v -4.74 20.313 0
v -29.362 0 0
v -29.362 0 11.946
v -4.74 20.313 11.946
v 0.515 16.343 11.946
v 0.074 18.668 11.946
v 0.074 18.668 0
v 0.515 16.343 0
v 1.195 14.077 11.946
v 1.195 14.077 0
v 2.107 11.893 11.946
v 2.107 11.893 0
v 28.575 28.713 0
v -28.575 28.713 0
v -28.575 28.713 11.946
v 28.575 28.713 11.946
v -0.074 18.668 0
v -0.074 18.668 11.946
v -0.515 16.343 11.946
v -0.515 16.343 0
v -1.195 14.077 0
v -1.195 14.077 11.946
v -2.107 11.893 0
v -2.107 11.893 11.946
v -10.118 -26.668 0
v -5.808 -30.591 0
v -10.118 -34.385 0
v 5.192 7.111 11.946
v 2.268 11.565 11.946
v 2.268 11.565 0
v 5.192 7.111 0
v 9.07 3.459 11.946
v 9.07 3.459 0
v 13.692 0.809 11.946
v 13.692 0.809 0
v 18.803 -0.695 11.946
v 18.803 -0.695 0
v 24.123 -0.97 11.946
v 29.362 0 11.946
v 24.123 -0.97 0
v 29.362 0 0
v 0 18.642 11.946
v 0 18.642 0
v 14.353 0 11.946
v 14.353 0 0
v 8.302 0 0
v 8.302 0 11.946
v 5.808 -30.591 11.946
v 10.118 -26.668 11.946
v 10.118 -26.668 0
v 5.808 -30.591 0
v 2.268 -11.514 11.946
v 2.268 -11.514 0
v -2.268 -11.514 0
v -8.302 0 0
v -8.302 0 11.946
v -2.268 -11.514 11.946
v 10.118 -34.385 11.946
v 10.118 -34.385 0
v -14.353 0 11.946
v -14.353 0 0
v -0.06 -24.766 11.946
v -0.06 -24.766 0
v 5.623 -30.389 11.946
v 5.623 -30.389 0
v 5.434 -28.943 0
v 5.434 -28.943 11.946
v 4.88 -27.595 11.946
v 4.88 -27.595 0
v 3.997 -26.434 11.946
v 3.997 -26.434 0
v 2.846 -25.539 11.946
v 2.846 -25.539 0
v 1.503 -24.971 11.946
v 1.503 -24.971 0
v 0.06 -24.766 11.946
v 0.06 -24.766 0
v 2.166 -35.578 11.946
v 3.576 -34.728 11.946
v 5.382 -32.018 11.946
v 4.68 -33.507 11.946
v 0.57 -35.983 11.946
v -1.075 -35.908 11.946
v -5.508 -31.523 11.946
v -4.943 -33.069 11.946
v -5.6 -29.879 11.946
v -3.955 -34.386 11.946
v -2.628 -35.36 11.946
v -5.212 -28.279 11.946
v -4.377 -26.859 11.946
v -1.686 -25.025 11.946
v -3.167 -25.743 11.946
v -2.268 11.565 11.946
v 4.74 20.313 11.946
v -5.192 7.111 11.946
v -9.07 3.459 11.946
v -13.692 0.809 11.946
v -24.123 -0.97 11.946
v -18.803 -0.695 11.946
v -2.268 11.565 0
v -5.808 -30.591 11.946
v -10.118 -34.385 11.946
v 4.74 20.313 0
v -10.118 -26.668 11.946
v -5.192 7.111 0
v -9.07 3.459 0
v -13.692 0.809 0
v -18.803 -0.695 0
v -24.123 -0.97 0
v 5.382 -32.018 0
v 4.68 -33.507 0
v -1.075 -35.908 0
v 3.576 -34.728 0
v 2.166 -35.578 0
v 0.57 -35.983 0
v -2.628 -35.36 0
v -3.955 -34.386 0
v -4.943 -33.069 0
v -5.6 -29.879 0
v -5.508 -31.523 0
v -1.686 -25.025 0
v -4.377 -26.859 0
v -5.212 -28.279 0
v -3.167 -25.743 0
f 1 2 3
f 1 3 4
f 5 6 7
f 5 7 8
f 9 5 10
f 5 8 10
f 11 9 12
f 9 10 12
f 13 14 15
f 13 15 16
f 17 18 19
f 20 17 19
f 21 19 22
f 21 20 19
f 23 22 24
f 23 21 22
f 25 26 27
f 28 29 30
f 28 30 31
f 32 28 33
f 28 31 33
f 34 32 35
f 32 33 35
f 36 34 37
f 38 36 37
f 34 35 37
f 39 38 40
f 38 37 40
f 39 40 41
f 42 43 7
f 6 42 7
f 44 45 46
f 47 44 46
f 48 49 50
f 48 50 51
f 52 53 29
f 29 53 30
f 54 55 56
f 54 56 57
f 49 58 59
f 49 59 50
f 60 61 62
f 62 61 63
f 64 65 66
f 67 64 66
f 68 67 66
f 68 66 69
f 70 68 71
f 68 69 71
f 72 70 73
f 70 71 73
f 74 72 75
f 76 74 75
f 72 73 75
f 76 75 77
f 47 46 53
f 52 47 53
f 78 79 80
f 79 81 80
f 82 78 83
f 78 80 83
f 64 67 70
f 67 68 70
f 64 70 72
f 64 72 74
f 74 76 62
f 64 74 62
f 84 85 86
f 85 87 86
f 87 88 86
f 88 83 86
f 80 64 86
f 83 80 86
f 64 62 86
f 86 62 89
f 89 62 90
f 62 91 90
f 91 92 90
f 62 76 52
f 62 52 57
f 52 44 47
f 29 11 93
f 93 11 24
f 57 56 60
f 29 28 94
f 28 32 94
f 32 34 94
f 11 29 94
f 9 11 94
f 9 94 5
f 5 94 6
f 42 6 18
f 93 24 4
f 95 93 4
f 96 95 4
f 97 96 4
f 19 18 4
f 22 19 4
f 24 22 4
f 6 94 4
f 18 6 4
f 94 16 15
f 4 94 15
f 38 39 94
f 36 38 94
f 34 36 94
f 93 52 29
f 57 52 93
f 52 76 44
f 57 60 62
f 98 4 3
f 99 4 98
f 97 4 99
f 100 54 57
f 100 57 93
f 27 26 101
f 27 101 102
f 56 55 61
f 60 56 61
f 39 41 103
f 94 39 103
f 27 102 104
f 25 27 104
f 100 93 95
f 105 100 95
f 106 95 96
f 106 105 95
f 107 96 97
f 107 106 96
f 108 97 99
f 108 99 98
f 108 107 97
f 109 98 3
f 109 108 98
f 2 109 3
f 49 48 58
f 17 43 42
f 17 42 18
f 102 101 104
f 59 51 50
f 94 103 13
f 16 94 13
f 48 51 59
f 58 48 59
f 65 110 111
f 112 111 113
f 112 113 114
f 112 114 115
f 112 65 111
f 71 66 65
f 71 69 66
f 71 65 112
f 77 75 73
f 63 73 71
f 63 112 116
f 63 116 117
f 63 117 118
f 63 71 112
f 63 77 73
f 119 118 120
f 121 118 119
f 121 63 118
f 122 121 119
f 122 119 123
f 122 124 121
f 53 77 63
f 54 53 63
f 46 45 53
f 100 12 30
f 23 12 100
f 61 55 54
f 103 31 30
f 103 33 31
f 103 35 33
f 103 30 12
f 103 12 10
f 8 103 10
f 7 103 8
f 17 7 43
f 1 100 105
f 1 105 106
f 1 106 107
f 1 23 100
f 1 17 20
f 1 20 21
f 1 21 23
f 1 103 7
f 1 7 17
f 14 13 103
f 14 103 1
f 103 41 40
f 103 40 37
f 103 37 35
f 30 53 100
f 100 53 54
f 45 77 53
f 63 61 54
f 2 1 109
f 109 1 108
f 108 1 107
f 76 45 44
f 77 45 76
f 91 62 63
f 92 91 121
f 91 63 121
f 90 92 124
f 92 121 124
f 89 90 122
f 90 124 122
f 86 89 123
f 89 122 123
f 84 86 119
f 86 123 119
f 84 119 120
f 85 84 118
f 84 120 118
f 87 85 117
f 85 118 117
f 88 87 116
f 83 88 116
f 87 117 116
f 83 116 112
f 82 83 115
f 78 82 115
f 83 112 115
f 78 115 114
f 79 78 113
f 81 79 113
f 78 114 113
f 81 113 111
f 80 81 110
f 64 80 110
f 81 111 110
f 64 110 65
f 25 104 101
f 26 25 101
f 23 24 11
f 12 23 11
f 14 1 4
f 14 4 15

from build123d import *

# Parameters (mm, degrees)
F1_DEPTH  = 25.4
F2_R      = 11.9558384694
F3_DEPTH  = 25.4
F4_W      = 9.4568333589
F4_H      = 59.8124749959
F5_DEPTH  = 25.4
F6_R      = 1.8560767539
F7_DEPTH  = 150
F9_DEPTH  = 25.4
F12_DEPTH = 25.4
F14_DEPTH = 25.4
F16_SCALE = 0.470317726


# Not quite as in the source:
# - an extrude ends at something that could not be found from the text; its depth is read off the source's solid


with BuildPart() as f1:
    # F0 (on Top) → F1 (new body)
    with BuildSketch(Plane.XY):
        Polygon((-21.0990961641, 0), (-30.5183306336, 0), (0, -52.8789311647), (27.7111772448, 0), (17.651008442, 0), (0, -33.6819490616), align=None)
    extrude(amount=F1_DEPTH)

    # F2 (on Top) → F3 (join)
    with BuildSketch(Plane.XY):
        with Locations((0, -64.6136105061)):
            Circle(F2_R)
    extrude(amount=F3_DEPTH)

    # F4 (on Top) → F5 (join)
    with BuildSketch(Plane.XY):
        with Locations((-0.0935860444, -4.6180915087)):
            Rectangle(F4_W, F4_H)
    extrude(amount=F5_DEPTH)

    # F6 (on Top) → F7 (cut, through all)
    with BuildSketch(Plane.XY):
        with Locations((0, -73.7877115607)):
            Circle(F6_R)
    extrude(amount=-F7_DEPTH, mode=Mode.SUBTRACT)

    # F11 (on Top) → F12 (join)
    with BuildSketch(Plane.XY):
        with BuildLine():
            Line((62.4291300774, 0), (0, 51.5045262873))
            ThreePointArc((0, 51.5045262873), (17.3111719438, 8.8998270841), (62.4291300774, 0))
        make_face()
    extrude(amount=F12_DEPTH)

    # F13 (on Top) → F14 (join)
    with BuildSketch(Plane.XY):
        Polygon((0, 61.0493794084), (0, 39.636798203), (60.7563517988, 61.0493794084), align=None)
    extrude(amount=F14_DEPTH)

    # F15: F1 across plane


with BuildPart() as f9:
    # F8 (on Top) → F9 (new body)
    with BuildSketch(Plane.XY):
        Polygon((21.5123444796, -56.7011386156), (12.3499445617, -65.0422051549), (21.5123444796, -73.1092691422), align=None)
    extrude(amount=F9_DEPTH)


with BuildPart() as f10_1:
    # F10: instance of F9
    add(f9.part.mirror(Plane.YZ))


with BuildPart() as f1_1:
    add(f1.part)
    add(f1.part.mirror(Plane.YZ))


with BuildPart() as f1_2:
    # F16: moved
    add(f1_1.part.scale(F16_SCALE))


with BuildPart() as f9_1:
    # F16: moved
    add(f9.part.scale(F16_SCALE))


with BuildPart() as f10_1_1:
    # F16: moved
    add(f10_1.part.scale(F16_SCALE))


solid = Compound([f1_2.part, f9_1.part, f10_1_1.part])
